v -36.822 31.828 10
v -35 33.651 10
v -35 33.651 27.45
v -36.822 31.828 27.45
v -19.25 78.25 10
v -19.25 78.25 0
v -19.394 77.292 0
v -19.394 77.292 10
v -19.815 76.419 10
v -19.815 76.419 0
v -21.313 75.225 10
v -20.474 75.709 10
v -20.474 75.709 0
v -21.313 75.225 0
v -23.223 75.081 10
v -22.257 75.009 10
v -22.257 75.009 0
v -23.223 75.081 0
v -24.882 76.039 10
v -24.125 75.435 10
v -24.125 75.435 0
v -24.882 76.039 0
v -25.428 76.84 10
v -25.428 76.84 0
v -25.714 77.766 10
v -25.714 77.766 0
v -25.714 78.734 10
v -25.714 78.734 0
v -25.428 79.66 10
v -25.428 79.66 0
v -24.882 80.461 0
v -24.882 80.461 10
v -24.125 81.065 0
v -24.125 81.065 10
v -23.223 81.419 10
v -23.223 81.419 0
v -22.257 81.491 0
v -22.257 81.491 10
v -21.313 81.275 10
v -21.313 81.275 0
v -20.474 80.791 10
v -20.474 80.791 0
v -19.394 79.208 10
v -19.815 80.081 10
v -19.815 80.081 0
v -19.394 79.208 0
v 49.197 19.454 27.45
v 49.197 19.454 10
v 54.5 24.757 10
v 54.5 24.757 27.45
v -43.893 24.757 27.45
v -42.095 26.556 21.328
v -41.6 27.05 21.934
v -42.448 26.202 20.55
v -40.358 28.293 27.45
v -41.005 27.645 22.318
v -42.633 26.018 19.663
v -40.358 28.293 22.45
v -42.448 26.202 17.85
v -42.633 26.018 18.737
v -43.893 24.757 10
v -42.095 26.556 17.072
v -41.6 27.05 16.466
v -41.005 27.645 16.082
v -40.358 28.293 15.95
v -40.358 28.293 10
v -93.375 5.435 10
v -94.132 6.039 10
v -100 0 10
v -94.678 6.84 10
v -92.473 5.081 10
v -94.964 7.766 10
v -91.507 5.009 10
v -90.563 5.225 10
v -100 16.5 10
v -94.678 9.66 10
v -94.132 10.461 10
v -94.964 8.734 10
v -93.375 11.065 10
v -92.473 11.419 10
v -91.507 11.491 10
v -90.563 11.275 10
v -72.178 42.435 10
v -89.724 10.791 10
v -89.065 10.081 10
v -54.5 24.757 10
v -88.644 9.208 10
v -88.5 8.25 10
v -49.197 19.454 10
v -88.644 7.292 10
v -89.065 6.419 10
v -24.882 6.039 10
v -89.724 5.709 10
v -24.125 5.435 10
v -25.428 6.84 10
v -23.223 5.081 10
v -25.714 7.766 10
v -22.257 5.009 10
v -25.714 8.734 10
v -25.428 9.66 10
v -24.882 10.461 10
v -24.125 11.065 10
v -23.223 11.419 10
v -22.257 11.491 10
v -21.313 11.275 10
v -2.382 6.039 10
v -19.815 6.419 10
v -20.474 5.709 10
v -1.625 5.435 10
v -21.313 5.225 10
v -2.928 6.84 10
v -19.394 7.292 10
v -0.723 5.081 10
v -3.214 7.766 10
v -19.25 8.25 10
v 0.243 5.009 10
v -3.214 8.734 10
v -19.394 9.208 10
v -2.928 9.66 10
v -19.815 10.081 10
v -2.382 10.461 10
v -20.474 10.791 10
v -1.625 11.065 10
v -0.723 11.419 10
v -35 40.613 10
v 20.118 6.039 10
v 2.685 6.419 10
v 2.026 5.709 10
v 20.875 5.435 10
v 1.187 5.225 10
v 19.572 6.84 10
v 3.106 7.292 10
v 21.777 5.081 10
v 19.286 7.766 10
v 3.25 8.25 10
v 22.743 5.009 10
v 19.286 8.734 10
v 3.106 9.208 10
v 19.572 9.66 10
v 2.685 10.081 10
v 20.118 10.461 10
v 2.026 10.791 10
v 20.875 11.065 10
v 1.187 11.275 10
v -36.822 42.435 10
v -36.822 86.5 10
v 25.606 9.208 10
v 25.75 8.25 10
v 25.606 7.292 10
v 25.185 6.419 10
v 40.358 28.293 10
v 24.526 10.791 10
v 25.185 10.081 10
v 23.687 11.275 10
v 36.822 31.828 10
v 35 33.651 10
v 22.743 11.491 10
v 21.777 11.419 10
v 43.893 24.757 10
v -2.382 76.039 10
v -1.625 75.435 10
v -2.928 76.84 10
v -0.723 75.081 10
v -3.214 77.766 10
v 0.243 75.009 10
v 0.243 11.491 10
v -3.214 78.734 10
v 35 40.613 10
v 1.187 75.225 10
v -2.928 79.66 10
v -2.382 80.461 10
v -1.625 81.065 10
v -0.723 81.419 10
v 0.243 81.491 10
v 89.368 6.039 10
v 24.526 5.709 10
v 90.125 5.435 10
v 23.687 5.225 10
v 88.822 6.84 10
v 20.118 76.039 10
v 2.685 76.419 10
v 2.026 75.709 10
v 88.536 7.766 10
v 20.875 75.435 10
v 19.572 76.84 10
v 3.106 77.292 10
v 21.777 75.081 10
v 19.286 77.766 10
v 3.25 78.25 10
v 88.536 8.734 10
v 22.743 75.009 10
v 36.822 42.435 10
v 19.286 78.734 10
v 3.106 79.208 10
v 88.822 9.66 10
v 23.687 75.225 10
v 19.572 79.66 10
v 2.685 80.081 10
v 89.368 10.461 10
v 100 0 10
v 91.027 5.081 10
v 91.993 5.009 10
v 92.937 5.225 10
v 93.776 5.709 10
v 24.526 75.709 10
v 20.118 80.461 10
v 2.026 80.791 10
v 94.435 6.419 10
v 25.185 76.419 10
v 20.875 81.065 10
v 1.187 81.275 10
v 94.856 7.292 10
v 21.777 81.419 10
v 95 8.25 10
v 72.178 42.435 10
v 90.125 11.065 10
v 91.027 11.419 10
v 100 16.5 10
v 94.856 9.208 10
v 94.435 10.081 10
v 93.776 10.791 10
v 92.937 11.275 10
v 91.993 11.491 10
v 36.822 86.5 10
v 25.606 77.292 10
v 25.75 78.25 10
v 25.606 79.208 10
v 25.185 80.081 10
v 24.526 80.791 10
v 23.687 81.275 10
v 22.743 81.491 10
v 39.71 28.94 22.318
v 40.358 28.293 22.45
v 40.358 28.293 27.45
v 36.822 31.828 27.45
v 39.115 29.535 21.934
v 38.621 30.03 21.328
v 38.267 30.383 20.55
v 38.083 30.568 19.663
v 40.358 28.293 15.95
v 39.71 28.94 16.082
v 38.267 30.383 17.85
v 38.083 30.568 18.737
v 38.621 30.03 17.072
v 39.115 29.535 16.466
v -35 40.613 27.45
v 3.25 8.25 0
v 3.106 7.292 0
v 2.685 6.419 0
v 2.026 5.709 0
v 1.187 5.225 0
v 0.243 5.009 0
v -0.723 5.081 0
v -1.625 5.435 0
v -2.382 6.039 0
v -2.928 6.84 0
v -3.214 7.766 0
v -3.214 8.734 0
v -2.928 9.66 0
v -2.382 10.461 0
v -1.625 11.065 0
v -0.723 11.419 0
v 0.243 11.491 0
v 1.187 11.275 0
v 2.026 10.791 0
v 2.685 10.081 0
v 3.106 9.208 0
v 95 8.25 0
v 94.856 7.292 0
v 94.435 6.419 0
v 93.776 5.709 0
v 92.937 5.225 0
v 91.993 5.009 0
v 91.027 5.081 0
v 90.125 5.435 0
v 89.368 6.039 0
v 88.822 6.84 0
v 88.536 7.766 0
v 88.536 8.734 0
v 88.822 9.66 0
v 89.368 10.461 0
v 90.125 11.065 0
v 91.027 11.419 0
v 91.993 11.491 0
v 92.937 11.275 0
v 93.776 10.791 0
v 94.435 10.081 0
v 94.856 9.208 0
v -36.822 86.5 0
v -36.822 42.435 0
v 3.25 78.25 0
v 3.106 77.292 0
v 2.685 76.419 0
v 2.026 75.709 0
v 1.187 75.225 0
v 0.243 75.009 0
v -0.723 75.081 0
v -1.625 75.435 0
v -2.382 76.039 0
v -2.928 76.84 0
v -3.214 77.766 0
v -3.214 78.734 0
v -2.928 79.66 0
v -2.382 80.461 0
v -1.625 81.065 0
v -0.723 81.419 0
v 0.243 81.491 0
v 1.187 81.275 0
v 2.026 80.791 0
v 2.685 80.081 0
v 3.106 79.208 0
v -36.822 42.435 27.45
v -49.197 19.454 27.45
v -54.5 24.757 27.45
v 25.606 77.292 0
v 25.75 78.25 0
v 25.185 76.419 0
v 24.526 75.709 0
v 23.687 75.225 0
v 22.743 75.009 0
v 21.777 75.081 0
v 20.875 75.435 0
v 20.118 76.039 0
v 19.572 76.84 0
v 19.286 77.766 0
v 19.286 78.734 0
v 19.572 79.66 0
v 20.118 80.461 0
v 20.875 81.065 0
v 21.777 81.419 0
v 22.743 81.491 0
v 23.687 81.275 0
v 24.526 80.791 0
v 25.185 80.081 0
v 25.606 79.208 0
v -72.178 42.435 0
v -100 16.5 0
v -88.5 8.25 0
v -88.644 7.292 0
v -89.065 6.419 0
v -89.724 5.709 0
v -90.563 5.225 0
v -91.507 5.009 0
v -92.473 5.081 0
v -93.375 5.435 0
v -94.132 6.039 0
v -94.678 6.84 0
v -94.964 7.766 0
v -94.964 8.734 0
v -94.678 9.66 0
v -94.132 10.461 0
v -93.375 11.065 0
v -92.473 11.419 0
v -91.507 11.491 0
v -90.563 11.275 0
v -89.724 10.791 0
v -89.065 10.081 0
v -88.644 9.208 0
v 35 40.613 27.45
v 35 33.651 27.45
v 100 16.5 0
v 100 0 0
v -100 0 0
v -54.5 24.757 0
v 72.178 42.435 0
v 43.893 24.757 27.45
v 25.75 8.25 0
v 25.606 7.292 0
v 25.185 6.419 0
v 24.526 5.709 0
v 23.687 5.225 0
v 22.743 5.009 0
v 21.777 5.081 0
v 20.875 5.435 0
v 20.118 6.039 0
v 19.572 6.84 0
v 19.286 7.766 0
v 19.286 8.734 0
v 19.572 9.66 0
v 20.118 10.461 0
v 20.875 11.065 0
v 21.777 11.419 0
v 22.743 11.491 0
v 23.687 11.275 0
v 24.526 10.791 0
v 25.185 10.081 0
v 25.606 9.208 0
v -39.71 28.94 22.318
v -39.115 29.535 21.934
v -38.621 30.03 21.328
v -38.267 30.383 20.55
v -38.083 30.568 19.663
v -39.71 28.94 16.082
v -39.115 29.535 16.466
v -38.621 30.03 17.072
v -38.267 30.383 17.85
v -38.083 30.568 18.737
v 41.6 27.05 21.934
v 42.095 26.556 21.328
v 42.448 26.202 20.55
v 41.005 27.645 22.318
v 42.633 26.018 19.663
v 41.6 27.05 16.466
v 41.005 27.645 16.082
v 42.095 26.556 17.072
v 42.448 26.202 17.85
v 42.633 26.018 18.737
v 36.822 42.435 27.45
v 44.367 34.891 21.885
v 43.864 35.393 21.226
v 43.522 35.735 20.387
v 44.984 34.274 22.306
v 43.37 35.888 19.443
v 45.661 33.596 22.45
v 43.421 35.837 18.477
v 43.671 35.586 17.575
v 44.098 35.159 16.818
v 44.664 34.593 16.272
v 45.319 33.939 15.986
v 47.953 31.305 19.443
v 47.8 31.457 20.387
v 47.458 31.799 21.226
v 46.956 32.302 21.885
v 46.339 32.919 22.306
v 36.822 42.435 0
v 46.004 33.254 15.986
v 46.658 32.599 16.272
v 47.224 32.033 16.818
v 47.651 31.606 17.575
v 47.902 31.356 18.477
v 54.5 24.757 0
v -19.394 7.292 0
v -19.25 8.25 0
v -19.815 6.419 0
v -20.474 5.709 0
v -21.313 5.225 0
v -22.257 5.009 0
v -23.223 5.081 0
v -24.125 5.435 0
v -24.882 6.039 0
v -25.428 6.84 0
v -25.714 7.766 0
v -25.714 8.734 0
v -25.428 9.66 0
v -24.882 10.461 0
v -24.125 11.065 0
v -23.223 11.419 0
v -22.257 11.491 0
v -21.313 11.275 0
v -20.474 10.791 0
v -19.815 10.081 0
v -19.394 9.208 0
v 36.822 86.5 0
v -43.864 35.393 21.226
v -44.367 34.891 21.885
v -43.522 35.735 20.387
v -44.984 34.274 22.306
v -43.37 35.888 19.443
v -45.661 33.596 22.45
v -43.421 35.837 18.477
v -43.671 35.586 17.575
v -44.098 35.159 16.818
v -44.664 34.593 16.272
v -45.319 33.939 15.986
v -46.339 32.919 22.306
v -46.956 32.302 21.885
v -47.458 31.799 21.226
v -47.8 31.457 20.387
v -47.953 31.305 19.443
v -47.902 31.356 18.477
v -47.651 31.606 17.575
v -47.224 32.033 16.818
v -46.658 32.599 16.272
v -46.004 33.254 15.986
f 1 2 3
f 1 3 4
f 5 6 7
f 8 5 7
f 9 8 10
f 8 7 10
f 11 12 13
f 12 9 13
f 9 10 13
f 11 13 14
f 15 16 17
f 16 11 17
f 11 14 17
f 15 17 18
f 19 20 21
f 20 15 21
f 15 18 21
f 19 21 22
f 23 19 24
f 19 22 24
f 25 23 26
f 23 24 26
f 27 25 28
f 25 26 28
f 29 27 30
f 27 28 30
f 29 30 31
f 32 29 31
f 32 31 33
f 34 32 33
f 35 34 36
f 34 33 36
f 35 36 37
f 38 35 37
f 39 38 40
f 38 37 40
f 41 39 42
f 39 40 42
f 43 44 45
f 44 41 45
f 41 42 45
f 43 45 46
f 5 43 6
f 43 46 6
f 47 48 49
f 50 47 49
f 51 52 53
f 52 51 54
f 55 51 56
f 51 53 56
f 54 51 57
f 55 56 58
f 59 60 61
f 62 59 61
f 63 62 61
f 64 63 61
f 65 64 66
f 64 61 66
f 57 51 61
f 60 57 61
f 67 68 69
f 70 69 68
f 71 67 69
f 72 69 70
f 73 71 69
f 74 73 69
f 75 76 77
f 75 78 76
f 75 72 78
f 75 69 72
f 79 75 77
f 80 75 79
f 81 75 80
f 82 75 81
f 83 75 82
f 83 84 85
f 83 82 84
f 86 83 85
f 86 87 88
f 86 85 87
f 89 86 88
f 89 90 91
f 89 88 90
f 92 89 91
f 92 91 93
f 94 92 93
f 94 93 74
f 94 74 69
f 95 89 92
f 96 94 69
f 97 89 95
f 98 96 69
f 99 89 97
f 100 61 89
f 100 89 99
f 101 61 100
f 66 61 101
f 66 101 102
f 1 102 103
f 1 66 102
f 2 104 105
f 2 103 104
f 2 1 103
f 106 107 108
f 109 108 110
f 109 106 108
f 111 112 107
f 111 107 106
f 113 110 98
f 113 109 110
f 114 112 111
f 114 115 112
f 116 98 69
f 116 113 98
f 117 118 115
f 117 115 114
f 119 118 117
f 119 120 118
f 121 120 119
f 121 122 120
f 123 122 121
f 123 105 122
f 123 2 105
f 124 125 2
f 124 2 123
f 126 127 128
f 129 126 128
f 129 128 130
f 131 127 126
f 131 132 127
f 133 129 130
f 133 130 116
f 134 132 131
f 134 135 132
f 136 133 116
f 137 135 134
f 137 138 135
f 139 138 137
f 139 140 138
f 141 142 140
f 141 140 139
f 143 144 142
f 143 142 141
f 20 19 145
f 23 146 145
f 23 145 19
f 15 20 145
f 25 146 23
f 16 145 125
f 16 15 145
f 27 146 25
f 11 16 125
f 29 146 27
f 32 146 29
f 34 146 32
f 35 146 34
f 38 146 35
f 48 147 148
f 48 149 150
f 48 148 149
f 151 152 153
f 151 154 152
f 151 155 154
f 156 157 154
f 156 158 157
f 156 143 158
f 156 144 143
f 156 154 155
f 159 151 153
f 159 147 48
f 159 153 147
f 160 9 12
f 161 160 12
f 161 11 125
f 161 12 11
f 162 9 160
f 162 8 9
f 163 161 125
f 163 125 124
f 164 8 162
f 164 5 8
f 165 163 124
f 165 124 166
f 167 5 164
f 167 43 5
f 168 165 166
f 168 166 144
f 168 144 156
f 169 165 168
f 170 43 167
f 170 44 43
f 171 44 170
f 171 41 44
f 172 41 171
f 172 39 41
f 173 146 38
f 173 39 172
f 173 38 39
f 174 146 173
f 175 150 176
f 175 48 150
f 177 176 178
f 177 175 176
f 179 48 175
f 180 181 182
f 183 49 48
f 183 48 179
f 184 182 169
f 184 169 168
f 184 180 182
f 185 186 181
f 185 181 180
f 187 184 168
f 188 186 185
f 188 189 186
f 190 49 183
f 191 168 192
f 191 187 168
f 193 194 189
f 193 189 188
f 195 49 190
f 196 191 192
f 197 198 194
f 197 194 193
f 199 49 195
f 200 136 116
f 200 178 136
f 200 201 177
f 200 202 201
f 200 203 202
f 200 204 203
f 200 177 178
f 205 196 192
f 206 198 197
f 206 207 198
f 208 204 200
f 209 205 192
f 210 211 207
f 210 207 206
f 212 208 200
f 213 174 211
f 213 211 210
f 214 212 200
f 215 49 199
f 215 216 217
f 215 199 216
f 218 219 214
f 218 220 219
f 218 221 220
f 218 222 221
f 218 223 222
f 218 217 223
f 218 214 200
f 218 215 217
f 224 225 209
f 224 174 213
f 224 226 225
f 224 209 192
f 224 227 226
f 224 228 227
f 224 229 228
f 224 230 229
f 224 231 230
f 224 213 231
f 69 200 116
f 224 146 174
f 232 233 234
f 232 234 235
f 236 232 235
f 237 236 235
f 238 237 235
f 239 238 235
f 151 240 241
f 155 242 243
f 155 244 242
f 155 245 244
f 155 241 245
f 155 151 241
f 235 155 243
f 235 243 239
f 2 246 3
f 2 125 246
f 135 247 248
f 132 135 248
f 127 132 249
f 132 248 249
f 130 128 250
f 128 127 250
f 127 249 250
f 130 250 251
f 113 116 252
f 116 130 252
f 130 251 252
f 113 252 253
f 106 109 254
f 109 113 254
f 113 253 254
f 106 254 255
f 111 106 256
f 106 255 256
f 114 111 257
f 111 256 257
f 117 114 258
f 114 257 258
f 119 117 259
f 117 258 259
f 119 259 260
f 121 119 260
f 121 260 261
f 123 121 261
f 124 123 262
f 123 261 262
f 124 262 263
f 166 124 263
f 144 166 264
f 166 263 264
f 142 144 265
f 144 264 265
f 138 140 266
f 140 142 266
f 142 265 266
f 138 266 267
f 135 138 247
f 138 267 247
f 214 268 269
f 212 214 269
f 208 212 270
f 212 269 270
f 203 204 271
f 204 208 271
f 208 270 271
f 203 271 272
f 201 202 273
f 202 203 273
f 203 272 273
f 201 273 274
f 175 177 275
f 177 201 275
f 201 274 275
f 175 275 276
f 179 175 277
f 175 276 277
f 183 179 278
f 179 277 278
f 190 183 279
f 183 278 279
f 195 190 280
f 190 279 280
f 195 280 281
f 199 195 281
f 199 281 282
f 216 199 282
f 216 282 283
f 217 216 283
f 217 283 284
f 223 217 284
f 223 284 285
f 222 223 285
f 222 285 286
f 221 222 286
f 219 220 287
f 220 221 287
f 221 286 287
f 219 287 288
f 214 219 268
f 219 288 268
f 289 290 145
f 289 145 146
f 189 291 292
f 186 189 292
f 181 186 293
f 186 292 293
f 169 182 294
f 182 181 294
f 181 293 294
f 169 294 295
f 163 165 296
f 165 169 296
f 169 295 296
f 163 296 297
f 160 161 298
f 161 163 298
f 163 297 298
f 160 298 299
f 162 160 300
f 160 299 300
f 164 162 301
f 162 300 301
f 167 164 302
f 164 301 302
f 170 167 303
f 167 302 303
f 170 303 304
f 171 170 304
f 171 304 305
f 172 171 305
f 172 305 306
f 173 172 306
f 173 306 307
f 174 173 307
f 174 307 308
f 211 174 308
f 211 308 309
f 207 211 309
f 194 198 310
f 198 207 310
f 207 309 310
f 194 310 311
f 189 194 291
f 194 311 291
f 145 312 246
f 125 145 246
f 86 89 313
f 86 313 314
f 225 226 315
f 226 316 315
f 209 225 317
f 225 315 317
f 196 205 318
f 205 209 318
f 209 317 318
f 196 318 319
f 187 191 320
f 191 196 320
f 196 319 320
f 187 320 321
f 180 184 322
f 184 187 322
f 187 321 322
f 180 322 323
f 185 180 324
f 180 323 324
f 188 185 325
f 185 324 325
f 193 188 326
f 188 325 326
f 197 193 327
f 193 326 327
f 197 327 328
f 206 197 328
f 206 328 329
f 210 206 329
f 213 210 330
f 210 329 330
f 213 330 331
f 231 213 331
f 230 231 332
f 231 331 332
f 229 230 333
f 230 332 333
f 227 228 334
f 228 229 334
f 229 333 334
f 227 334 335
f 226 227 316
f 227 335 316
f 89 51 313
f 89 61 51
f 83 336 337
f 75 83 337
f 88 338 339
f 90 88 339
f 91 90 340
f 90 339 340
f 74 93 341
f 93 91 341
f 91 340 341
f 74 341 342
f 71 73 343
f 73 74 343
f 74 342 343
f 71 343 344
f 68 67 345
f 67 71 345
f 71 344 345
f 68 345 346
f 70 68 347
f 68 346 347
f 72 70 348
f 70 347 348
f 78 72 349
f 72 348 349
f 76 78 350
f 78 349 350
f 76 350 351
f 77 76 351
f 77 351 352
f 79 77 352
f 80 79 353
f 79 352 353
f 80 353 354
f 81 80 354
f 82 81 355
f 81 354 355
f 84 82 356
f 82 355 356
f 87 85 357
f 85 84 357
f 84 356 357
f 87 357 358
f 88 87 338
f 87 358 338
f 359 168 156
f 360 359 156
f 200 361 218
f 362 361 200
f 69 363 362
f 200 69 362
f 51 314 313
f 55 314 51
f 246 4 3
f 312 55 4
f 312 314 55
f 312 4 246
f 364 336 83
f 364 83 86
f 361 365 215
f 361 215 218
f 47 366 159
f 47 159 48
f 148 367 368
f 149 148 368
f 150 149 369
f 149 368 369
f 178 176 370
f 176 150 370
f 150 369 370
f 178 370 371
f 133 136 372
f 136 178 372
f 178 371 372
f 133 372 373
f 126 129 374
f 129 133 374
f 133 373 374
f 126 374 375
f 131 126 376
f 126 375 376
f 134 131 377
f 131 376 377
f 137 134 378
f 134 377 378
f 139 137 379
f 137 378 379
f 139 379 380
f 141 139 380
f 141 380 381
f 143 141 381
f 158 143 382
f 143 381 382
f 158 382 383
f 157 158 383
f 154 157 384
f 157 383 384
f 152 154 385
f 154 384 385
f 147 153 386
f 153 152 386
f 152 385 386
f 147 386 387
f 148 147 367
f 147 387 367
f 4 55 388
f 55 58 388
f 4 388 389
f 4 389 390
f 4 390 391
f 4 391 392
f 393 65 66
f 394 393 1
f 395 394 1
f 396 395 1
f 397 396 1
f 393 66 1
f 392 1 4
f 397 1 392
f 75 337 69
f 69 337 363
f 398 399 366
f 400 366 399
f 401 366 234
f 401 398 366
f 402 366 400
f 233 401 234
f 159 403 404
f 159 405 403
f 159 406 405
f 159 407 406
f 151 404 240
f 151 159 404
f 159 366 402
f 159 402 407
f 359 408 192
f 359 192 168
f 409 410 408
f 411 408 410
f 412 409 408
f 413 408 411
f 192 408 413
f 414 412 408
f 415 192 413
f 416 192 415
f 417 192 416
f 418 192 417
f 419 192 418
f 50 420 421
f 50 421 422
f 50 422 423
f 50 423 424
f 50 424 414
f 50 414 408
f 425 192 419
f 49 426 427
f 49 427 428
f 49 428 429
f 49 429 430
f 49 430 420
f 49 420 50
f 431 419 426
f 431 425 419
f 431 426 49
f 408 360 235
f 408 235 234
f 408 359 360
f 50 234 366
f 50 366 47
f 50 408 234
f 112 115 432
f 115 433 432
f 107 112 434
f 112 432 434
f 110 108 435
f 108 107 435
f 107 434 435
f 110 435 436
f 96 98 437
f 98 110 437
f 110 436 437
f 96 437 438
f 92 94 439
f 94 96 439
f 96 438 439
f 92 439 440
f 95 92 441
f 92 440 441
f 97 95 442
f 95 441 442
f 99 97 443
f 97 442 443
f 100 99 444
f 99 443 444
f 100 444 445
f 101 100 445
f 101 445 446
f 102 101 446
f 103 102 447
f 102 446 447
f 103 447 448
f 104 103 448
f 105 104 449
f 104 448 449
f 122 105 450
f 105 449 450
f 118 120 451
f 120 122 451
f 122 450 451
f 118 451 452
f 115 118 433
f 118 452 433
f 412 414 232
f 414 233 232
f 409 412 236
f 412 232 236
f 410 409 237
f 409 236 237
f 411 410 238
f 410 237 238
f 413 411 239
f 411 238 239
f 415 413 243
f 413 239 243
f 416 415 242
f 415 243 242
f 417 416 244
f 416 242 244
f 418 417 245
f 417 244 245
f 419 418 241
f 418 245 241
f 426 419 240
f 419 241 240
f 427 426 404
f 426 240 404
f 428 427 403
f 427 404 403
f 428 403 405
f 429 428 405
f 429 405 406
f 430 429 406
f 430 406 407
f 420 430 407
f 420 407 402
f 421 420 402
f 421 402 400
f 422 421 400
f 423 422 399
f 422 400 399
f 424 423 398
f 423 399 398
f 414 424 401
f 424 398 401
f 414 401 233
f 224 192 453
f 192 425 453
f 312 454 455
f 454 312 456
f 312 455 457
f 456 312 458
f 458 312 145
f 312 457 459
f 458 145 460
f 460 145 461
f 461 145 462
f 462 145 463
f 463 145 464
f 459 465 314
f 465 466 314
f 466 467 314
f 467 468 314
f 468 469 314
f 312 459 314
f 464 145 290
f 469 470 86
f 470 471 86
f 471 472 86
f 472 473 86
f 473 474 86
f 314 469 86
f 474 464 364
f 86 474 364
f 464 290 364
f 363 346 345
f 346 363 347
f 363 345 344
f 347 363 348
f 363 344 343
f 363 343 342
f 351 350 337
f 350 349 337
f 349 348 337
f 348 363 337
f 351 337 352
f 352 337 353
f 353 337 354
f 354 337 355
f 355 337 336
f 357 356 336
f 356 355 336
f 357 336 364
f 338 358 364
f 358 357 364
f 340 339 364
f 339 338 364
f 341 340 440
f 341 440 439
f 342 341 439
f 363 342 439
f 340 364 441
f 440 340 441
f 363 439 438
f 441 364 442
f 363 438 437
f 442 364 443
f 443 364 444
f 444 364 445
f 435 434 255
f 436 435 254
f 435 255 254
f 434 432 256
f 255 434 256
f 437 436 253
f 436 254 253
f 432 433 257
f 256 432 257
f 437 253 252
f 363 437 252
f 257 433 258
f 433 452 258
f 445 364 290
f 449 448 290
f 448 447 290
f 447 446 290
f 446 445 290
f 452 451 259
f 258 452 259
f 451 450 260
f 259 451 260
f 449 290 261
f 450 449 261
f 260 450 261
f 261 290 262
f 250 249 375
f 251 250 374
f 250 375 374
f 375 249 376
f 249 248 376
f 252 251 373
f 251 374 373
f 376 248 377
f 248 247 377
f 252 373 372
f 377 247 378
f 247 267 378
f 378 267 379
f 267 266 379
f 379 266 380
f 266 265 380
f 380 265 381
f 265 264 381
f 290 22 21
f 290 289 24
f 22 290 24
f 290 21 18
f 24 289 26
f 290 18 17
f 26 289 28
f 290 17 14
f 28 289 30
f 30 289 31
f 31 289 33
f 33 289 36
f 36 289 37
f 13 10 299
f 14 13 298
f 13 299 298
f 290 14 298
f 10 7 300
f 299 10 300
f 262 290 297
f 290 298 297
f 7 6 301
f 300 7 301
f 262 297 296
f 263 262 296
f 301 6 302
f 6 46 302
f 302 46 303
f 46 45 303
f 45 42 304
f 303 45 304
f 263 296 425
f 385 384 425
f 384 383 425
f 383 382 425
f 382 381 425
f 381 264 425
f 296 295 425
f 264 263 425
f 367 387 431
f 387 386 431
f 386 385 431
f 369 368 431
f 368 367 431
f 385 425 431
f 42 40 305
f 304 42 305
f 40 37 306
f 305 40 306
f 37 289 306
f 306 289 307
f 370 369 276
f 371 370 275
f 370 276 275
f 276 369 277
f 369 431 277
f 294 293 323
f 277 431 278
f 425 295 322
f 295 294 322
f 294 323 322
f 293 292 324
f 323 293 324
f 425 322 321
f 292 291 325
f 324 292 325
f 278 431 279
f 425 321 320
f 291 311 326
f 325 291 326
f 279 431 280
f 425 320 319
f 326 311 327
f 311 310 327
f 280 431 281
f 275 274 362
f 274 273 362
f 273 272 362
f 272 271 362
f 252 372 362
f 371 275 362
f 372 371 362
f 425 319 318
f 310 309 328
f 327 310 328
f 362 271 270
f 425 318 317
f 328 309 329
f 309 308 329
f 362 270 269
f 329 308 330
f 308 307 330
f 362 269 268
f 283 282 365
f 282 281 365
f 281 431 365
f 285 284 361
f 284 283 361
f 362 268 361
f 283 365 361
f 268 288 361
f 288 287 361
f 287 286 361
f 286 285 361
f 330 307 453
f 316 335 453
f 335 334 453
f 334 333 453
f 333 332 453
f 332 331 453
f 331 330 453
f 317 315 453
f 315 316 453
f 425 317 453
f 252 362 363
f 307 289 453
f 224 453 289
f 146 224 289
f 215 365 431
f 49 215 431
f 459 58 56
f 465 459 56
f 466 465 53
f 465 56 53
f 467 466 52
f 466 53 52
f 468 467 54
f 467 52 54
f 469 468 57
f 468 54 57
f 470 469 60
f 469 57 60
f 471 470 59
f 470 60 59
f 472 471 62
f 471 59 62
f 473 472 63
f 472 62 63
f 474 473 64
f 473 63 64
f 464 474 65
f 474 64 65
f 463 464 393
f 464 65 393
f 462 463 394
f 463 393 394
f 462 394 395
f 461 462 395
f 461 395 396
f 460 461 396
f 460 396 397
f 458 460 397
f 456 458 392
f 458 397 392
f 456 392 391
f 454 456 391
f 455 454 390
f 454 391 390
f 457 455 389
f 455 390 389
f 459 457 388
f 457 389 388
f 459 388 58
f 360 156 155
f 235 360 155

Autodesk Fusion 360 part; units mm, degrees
sketch "Sketch1" plane through (0, 0, 0) normal (0, 0, 1) x (1, 0, 0)
  line L0 (-100, 0) -> (100, 0)
  line L1 (100, 0) -> (91.75, 0) construction
  line L2 (91.75, 0) -> (91.75, 8.25) construction
  line L3 (91.75, 8.25) -> (100, 8.25) construction
  line L4 (100, 8.25) -> (100, 0) construction
  line L5 (-100, 0) -> (-91.75, 0) construction
  line L6 (-91.75, 0) -> (-91.75, 8.25) construction
  line L7 (-91.75, 8.25) -> (-100, 8.25) construction
  line L8 (-100, 8.25) -> (-100, 0) construction
  circle A0 centre (-91.75, 8.25) radius 3.25
  circle A1 centre (91.75, 8.25) radius 3.25
  line L9 (0, 0) -> (0, 60) construction
  line L10 (-48.5, 60) -> (48.5, 60) construction
  line L11 (48.5, 85) -> (60.5, 85) construction
  line L12 (60.5, 85) -> (60.5, 35) construction
  line L13 (60.5, 35) -> (48.5, 35) construction
  line L14 (48.5, 35) -> (48.5, 85) construction
  line L15 (-60.5, 85) -> (-48.5, 85) construction
  line L16 (-48.5, 85) -> (-48.5, 35) construction
  line L17 (-48.5, 35) -> (-60.5, 35) construction
  line L18 (-60.5, 35) -> (-60.5, 85) construction
  line L19 (0, 0) -> (0, 8.25) construction
  line L20 (22.5, 8.25) -> (22.5, 78.25) construction
  line L21 (22.5, 78.25) -> (-22.5, 78.25) construction
  line L22 (-22.5, 78.25) -> (-22.5, 8.25) construction
  circle A2 centre (-22.5, 78.25) radius 3.25
  circle A3 centre (22.5, 78.25) radius 3.25
  circle A4 centre (22.5, 8.25) radius 3.25
  circle A5 centre (-22.5, 8.25) radius 3.25
  line L23 (-48.5, 35) -> (-55.5711, 27.9289) construction
  line L24 (-60.5, 35) -> (-53.4289, 27.9289) construction
  line L25 (-60.5, 35) -> (-48.5, 35) construction
  line L26 (48.5, 35) -> (55.5711, 27.9289) construction
  line L27 (48.5, 35) -> (60.5, 35) construction
  line L28 (60.5, 35) -> (53.4289, 27.9289) construction
  line L29 (-54.5, 29) -> (-38.9437, 44.5563) construction
  line L30 (-54.5, 29) -> (-70.0563, 44.5563) construction
  line L31 (54.5, 29) -> (70.0563, 44.5563) construction
  line L32 (54.5, 29) -> (38.9437, 44.5563) construction
  line L33 (22.5, 8.25) -> (-22.5, 8.25) construction
  line L34 (70.0563, 44.5563) -> (72.1777, 42.435) construction
  line L35 (38.9437, 44.5563) -> (36.8223, 42.435) construction
  line L36 (-38.9437, 44.5563) -> (-36.8223, 42.435) construction
  line L37 (-70.0563, 44.5563) -> (-72.1777, 42.435) construction
  line L38 (72.1777, 42.435) -> (54.5, 24.7574)
  line L39 (36.8223, 42.435) -> (54.5, 24.7574)
  line L40 (-36.8223, 42.435) -> (-54.5, 24.7574)
  line L41 (-72.1777, 42.435) -> (-54.5, 24.7574)
  line L42 (-36.8223, 42.435) -> (-36.8223, 86.5)
  line L43 (36.8223, 42.435) -> (36.8223, 86.5)
  line L44 (36.8223, 86.5) -> (-36.8223, 86.5)
  line L45 (45.6612, 33.5962) -> (40.3579, 28.2929) construction
  line L46 (-45.6612, 33.5962) -> (-40.3579, 28.2929) construction
  line L47 (-40.3579, 28.2929) -> (-36.8223, 31.8284)
  line L48 (-36.8223, 31.8284) -> (-33.2868, 28.2929)
  line L49 (-33.2868, 28.2929) -> (-40.3579, 21.2218)
  line L50 (-40.3579, 21.2218) -> (-43.8934, 24.7574)
  line L51 (-43.8934, 24.7574) -> (-40.3579, 28.2929)
  line L52 (40.3579, 28.2929) -> (36.8223, 31.8284)
  line L53 (36.8223, 31.8284) -> (33.2868, 28.2929)
  line L54 (33.2868, 28.2929) -> (40.3579, 21.2218)
  line L55 (40.3579, 21.2218) -> (43.8934, 24.7574)
  line L56 (43.8934, 24.7574) -> (40.3579, 28.2929)
  line L57 (-91.75, 8.25) -> (-91.75, 16.5) construction
  line L58 (91.75, 8.25) -> (91.75, 16.5) construction
  line L59 (100, 16.5) -> (100, 0)
  line L60 (-100, 16.5) -> (-100, 0)
  line L61 (72.1777, 42.435) -> (100, 16.5)
  line L62 (-72.1777, 42.435) -> (-100, 16.5)
  line L63 (-36.8223, 42.435) -> (-31.519, 37.1317)
  line L64 (-31.519, 37.1317) -> (-49.1967, 19.4541)
  line L65 (-49.1967, 19.4541) -> (-54.5, 24.7574)
  line L66 (36.8223, 42.435) -> (31.519, 37.1317)
  line L67 (31.519, 37.1317) -> (49.1967, 19.4541)
  line L68 (49.1967, 19.4541) -> (54.5, 24.7574)
  line L69 (36.8223, 42.435) -> (36.8223, 31.8284)
  circle A6 centre (0, 8.25) radius 3.25
  circle A7 centre (0, 78.25) radius 3.25
  line L70 (-35, 43.25) -> (-10, 43.25) construction
  line L71 (-35, 40.6127) -> (-35, 33.6508)
  line L72 (10, 43.25) -> (35, 43.25) construction
  line L73 (35, 40.6127) -> (35, 33.6508)
  dimension "d2" = 200
  dimension "d3" = 8.25
  dimension "d4" = 8.25
  dimension "d5" = 8.25
  dimension "d6" = 8.25
  dimension "d7" = 6.5
  dimension "d8" = 6.5
  dimension "d9" = 60
  dimension "d10" = 97
  dimension "d11" = 12
  dimension "d12" = 50
  dimension "d13" = 12
  dimension "d14" = 50
  dimension "d15" = 8.25
  dimension "d16" = 45
  dimension "d17" = 70
  dimension "d18" = 6.5
  dimension "d19" = 6.5
  dimension "d20" = 6.5
  dimension "d21" = 6.5
  dimension "d22" = 10
  dimension "d24" = 45
  dimension "d25" = 10
  dimension "d26" = 45
  dimension "d27" = 10
  dimension "d28" = 10
  dimension "d29" = 22
  dimension "d30" = 22
  dimension "d31" = 22
  dimension "d32" = 22
  dimension "d33" = 3
  dimension "d34" = 3
  dimension "d35" = 3
  dimension "d36" = 3
  dimension "d37" = 25
  dimension "d38" = 25
  dimension "d39" = 25
  dimension "d41" = 25
  dimension "d44" = 7.5
  dimension "d45" = 7.5
  dimension "d46" = 5
  dimension "d47" = 5
  dimension "d48" = 10
  dimension "d49" = 5
  dimension "d50" = 5
  dimension "d51" = 5
  dimension "d52" = 10
  dimension "d53" = 5
  dimension "d54" = 86.5
  dimension "d57" = 8.25
  dimension "d58" = 8.25
  dimension "d69" = 7.5
  dimension "d70" = 25
  dimension "d71" = 7.5
  dimension "d72" = 25
  dimension "d85" = 6.5
  dimension "d86" = 6.5
  dimension "d87" = 25
  dimension "d88" = 25
extrude "Extrude2" add sketch "Sketch1" along normal blind 10 contours L0 L38 L41 L42 L43 L44 L48 L49 L50 L53 L54 L55 L59 L60 L61 L62 L63 L64 L65 L66 L67 L68 | L40 L47 L51 L63 L64 L65 L71 | L66 L67 L69 L73 | L63 L64 L71 | L47 L48 L49 L50 L51 L64 | L66 L67 L73 | L52 L53 L54 L55 L56 L67
extrude "Extrude3" add sketch "Sketch1" along normal blind 27.45 contours L40 L47 L51 L63 L64 L65 L71 | L39 L52 L56 L67 L68 L69 | L66 L67 L69 L73
sketch "Sketch4" plane through (39.6287, 39.6287, 0) normal (0.7071, 0.7071, 0) x (-0.7071, 0.7071, 0)
  line L0 (-21.0312, 0) -> (3.9688, 0)
  line L1 (3.9688, 27.45) -> (-21.0312, 27.45)
  line L2 (-21.0312, 27.45) -> (-21.0312, 10)
  line L3 (-21.0312, 10) -> (-21.0312, 0)
  line L4 (-8.5312, 27.45) -> (-8.5312, 19.2) construction
  line L5 (3.9688, 0) -> (3.9688, 10)
  line L6 (3.9688, 10) -> (3.9688, 27.45)
  dimension "d77" = 8.25
sketch "Sketch5" plane through (-39.6287, 39.6287, 0) normal (-0.7071, 0.7071, 0) x (-0.7071, -0.7071, 0)
  line L0 (-3.9688, 0) -> (21.0312, 0)
  line L1 (21.0312, 0) -> (21.0312, 10)
  line L2 (21.0312, 10) -> (21.0312, 27.45)
  line L3 (21.0312, 27.45) -> (-3.9688, 27.45)
  line L4 (8.5312, 27.45) -> (8.5312, 19.2) construction
  line L5 (-3.9688, 10) -> (-3.9688, 0)
  line L6 (-3.9688, 27.45) -> (-3.9688, 10)
  dimension "d78" = 8.25
hole "Hole3" at (-45.6612, 33.5962, 19.2) direction (0.7071, -0.7071, 0) diameter 6.5 depth 7.5 tip angle 180
hole "Hole4" at (45.6612, 33.5962, 19.2) direction (-0.7071, -0.7071, 0) diameter 6.5 depth 7.5 tip angle 180
equation "d3 = 5 mm + 3.25 mm"
equation "d4 = 5 mm + 3.25 mm"
equation "d5 = 5 mm + 3.25 mm"
equation "d6 = 5 mm + 3.25 mm"
equation "d10 = 121 mm - 24 mm"
equation "d15 = 5 mm + 3.25 mm"
equation "d54 = 90 mm - 3.5 mm"
equation "d75 = 30.7 mm - 3.25 mm"
